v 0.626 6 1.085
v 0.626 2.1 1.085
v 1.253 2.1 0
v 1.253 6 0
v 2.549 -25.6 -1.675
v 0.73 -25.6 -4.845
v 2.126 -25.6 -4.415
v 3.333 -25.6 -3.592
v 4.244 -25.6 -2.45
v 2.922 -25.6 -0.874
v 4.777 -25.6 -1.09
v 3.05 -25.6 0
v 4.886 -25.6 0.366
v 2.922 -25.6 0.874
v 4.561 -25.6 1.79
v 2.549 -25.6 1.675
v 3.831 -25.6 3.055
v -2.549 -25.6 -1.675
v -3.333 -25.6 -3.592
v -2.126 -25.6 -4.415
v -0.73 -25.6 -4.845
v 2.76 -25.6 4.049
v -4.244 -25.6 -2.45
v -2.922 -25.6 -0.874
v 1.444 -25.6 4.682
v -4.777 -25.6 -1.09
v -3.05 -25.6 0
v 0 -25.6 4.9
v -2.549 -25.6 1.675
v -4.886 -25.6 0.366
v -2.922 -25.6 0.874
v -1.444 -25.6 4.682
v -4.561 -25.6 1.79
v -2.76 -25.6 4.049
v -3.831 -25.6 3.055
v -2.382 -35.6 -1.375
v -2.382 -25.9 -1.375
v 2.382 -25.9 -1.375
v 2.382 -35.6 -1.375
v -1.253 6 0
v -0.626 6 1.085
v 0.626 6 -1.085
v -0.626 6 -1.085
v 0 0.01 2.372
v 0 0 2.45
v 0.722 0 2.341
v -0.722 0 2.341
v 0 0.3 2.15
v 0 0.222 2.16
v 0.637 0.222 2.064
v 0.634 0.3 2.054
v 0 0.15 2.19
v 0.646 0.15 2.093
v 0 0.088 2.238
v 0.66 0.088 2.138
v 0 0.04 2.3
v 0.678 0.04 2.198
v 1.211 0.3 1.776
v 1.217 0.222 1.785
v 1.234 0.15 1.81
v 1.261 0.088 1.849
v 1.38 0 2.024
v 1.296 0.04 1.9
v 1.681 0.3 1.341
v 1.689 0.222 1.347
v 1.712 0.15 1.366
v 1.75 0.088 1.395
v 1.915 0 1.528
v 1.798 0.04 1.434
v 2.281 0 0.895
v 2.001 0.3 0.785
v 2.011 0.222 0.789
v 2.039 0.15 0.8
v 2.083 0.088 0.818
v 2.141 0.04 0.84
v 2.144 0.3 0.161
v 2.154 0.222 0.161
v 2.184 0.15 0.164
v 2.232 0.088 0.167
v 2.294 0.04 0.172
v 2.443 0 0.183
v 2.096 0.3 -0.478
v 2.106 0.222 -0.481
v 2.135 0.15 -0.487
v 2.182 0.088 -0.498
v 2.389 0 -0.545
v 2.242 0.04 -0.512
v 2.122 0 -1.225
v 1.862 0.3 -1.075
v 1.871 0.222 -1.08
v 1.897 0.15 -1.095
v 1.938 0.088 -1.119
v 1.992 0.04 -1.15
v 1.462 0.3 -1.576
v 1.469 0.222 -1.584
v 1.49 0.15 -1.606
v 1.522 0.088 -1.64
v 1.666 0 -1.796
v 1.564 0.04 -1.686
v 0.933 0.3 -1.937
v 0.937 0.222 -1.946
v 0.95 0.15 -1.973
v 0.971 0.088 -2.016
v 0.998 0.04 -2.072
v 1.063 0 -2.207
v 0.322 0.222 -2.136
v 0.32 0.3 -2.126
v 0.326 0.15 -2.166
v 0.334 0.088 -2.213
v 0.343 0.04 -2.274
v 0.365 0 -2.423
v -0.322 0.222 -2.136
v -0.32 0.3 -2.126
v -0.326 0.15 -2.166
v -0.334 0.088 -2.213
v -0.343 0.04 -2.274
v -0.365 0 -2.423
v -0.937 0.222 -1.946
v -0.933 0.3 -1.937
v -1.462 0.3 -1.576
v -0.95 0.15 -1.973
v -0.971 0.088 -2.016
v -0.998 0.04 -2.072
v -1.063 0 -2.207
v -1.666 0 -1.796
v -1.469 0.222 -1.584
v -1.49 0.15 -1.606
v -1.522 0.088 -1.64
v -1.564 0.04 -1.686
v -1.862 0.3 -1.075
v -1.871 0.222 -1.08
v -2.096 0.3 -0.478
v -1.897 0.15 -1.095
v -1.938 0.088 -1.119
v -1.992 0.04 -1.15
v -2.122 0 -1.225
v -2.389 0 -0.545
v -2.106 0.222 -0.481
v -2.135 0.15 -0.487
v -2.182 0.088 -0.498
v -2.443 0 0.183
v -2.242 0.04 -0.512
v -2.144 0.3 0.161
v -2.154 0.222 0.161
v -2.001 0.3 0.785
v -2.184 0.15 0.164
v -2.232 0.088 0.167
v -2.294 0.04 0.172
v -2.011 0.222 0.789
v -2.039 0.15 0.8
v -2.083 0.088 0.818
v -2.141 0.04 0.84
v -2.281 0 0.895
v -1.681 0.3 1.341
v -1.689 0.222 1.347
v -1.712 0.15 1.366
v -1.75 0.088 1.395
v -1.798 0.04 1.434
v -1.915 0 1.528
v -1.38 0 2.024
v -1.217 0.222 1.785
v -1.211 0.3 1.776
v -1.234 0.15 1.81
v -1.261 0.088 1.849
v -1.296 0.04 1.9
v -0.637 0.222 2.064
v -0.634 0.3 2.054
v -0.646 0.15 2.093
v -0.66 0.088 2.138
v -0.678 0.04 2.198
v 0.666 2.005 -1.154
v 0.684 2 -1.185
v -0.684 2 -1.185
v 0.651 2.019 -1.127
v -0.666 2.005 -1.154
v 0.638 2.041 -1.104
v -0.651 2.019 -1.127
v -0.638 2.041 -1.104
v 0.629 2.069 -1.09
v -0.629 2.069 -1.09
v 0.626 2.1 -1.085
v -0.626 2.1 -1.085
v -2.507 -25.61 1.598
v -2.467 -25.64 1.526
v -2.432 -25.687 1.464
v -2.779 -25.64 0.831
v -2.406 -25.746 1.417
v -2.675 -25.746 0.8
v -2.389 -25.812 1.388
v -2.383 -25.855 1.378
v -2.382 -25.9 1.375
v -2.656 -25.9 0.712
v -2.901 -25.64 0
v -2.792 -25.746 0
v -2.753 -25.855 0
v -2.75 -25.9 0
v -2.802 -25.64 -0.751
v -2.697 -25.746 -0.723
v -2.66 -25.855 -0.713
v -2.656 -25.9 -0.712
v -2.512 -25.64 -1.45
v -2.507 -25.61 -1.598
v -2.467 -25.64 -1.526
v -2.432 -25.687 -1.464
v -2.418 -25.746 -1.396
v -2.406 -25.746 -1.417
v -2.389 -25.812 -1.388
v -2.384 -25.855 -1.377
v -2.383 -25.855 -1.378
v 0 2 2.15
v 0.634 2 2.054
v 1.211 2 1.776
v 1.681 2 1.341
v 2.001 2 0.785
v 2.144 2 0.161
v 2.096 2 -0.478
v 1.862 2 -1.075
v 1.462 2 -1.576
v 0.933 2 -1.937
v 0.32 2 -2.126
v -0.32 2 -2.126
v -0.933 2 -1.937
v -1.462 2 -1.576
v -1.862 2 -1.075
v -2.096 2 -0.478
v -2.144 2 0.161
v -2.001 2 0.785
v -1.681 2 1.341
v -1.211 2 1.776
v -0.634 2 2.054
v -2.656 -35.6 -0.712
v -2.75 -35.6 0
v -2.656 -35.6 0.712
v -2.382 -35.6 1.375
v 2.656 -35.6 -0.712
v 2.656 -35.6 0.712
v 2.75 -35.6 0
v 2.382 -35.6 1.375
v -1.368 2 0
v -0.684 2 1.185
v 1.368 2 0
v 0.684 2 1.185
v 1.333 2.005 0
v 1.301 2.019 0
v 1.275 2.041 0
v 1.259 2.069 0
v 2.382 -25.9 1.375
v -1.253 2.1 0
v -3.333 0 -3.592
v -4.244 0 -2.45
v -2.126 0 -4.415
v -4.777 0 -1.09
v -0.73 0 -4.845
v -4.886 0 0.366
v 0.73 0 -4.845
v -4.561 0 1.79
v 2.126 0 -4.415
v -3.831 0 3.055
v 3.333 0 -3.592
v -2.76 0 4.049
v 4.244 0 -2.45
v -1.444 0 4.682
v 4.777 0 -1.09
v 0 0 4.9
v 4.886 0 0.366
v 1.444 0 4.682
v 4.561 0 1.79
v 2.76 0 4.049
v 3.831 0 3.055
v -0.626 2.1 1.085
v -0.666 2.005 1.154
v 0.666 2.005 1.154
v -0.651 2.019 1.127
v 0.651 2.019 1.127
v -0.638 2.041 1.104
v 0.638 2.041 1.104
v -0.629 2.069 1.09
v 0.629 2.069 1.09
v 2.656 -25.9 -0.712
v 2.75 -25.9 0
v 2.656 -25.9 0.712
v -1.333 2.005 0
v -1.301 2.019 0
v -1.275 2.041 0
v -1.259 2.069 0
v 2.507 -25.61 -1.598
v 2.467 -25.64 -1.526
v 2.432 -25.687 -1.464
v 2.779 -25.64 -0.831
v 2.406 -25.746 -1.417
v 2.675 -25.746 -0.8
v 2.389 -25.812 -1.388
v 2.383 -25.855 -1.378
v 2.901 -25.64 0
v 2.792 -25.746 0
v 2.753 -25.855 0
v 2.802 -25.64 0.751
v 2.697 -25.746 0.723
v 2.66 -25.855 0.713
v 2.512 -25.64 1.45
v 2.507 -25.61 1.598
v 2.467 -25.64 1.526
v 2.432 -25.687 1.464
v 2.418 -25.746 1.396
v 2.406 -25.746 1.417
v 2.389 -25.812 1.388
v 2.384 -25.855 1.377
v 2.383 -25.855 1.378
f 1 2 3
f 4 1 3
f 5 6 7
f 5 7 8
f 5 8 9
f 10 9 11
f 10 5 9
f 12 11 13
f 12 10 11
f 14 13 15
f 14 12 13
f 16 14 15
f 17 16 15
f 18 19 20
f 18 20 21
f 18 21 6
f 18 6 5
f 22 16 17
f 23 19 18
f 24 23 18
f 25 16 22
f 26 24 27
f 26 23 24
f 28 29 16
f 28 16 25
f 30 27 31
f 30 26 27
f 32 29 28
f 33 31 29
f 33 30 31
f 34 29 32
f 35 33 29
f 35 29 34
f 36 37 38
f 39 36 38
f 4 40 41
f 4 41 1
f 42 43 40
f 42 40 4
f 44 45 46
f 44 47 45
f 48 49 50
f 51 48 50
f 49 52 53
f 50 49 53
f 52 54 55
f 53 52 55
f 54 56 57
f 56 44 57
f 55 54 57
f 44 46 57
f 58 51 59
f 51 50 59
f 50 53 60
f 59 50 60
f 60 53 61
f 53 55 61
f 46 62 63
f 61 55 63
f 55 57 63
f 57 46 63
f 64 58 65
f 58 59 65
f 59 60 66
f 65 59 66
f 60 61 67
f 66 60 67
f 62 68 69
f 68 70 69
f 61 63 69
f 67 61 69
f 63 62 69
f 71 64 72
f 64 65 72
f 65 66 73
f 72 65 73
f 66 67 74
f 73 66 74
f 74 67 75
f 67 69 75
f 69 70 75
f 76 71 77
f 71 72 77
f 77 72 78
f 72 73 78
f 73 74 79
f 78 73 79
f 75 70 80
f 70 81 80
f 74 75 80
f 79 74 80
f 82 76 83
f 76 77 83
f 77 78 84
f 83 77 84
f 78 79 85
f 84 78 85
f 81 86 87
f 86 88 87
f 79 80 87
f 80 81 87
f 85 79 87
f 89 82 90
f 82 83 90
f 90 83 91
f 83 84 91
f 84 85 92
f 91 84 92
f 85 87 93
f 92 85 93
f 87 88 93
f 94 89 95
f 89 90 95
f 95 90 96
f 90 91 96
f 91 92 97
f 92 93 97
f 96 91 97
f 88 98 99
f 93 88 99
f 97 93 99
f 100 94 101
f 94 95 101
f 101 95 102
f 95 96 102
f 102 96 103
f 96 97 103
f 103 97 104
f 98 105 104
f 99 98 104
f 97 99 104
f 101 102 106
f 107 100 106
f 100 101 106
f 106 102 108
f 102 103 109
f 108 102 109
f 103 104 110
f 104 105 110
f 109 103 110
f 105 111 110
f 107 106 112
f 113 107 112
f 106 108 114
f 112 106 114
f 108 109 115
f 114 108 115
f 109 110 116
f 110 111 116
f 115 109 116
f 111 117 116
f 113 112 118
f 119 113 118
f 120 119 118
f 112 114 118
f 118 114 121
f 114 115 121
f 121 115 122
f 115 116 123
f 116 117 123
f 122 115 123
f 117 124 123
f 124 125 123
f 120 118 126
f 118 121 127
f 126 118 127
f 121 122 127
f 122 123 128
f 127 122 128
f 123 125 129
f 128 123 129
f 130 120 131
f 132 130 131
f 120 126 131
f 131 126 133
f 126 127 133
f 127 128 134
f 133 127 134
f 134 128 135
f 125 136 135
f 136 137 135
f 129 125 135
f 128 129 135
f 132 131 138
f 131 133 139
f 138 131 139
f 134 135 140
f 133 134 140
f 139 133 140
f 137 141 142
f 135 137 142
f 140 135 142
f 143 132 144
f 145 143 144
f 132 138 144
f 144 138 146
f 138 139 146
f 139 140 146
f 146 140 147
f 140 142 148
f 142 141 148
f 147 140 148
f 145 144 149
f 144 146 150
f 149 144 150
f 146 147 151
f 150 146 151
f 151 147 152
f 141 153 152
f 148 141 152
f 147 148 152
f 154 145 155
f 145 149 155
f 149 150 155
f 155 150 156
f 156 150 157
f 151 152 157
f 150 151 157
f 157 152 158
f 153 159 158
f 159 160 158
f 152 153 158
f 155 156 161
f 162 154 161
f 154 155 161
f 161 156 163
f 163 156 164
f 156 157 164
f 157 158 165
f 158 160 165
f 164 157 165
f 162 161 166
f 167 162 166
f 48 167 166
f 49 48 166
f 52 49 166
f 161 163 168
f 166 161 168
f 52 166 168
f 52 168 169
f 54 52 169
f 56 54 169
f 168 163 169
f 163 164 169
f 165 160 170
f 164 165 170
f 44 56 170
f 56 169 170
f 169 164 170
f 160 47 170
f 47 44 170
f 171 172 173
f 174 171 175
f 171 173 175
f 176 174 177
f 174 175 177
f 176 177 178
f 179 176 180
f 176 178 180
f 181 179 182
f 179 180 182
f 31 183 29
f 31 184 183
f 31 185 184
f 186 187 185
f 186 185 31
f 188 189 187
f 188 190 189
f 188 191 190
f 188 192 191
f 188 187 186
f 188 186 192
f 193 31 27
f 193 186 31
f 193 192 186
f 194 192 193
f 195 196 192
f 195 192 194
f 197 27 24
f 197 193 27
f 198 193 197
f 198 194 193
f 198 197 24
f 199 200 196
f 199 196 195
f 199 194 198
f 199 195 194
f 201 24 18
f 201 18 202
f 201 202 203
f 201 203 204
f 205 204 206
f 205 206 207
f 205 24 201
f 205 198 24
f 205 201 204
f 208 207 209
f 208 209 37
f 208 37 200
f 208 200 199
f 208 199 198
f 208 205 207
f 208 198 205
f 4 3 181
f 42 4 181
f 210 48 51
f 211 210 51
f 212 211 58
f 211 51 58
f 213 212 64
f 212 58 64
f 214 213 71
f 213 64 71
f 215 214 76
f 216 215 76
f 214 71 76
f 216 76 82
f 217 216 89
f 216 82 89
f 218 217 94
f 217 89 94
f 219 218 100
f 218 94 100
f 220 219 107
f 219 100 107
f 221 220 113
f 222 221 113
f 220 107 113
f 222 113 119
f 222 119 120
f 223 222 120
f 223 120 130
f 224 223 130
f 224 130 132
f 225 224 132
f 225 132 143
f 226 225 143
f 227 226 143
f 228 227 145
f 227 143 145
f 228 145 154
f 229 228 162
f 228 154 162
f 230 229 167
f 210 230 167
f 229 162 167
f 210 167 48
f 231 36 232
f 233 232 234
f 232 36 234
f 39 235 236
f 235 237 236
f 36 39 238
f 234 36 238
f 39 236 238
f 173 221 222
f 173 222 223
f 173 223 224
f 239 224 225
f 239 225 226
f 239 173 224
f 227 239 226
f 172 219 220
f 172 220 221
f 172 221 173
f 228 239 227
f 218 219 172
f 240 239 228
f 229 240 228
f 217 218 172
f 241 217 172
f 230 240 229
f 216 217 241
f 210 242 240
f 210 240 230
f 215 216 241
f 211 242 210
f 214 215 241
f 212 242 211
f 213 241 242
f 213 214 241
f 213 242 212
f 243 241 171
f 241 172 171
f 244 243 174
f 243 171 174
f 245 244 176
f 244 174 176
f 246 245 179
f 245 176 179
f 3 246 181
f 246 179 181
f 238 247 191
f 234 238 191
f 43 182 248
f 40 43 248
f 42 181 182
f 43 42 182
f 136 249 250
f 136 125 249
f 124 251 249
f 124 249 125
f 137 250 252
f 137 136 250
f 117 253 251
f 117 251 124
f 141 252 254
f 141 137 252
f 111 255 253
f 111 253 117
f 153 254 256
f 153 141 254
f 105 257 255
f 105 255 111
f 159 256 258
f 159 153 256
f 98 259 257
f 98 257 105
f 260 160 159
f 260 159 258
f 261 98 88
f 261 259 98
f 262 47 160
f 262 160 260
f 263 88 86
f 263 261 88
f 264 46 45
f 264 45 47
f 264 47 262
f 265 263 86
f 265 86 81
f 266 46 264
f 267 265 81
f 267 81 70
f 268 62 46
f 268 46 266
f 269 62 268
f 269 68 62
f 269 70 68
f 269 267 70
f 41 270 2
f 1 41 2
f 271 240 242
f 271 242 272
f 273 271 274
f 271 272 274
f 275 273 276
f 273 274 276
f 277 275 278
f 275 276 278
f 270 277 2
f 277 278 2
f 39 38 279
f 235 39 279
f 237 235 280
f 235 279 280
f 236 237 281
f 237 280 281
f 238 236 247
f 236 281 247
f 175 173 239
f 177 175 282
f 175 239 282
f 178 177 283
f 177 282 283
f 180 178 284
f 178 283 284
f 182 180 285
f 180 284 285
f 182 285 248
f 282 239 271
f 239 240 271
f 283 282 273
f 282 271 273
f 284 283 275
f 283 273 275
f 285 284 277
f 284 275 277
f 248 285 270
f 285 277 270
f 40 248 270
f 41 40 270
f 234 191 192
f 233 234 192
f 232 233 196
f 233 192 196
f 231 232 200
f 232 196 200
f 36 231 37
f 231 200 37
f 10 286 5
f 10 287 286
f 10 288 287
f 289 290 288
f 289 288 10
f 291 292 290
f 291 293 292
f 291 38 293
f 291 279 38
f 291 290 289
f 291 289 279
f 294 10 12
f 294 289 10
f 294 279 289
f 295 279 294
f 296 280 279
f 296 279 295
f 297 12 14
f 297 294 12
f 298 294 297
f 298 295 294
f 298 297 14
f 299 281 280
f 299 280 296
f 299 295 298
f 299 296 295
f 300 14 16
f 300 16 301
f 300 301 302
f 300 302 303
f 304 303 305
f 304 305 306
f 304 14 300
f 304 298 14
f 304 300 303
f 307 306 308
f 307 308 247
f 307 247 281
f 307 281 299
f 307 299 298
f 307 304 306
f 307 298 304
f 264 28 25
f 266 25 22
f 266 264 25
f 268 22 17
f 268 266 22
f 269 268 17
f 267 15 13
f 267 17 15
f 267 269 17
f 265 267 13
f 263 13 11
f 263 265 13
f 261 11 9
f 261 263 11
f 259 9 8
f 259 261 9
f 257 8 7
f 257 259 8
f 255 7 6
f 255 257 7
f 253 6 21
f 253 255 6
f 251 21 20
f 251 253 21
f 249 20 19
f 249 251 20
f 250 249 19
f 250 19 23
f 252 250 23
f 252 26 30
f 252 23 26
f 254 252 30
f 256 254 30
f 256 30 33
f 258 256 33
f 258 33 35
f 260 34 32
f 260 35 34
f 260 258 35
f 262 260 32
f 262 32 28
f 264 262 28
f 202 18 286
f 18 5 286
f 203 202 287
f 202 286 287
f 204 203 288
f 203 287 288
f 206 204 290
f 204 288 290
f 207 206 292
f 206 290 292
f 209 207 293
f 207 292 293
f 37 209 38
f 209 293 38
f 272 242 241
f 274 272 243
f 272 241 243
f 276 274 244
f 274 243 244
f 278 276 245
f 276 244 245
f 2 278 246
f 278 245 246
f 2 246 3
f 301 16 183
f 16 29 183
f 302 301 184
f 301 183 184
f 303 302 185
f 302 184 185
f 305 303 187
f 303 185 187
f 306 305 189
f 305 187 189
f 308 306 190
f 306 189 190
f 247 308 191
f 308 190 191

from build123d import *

# Parameters (mm, degrees)
CROQUIS5_R              = 4.9
SALIENTE_EXTRUIR1_DEPTH = 35.6
CROQUIS6_R              = 2.15
SALIENTE_EXTRUIR2_DEPTH = 2
SALIENTE_EXTRUIR3_DEPTH = 4
REDONDEO3_R             = 0.1
REDONDEO4_R             = 0.3
CORTAR_EXTRUIR1_START   = -10
CROQUIS8_R              = 4.9
CORTAR_EXTRUIR1_DEPTH   = 10
REDONDEO5_R             = 0.3


with BuildPart() as part:
    # Croquis5 → Saliente-Extruir1 (new body)
    with BuildSketch(Plane(origin=(0, 0, 0), x_dir=(1, 0, 0), z_dir=(0, 1, 0))):
        with Locations(Location((0, 0, 0), (0, 0, 270))):
            Circle(CROQUIS5_R)
    extrude(amount=-SALIENTE_EXTRUIR1_DEPTH)

    # Croquis6 → Saliente-Extruir2 (add)
    with BuildSketch(Plane(origin=(0, 0, 0), x_dir=(1, 0, 0), z_dir=(0, 1, 0))):
        with Locations(Location((0, 0, 0), (0, 0, 270))):
            Circle(CROQUIS6_R)
    extrude(amount=SALIENTE_EXTRUIR2_DEPTH)

    # Croquis7 → Saliente-Extruir3 (add)
    with BuildSketch(Plane(origin=(0, 2, 0), x_dir=(1, 0, 0), z_dir=(0, 1, 0))):
        Polygon((1.252850084, 0), (0.626425042, 1.085), (-0.626425042, 1.085), (-1.252850084, 0), (-0.626425042, -1.085), (0.626425042, -1.085), align=None)
    extrude(amount=SALIENTE_EXTRUIR3_DEPTH)

    # Redondeo3
    redondeo3_edges = [part.edges().sort_by_distance(p)[0] for p in [
        (0.939637563, 2, 0.5425),
        (0.939637563, 2, -0.5425),
        (0, 2, -1.085),
        (-0.939637563, 2, -0.5425),
        (-0.939637563, 2, 0.5425),
        (0, 2, 1.085),
    ]]
    fillet(redondeo3_edges, radius=REDONDEO3_R)

    # Redondeo4
    redondeo4_edges = [part.edges().sort_by_distance(p)[0] for p in [
        (0, 0, -2.15),
    ]]
    fillet(redondeo4_edges, radius=REDONDEO4_R)

    # Croquis8 → Cortar-Extruir1 (cut)
    with BuildSketch(Plane.XZ.offset(35.6).offset(CORTAR_EXTRUIR1_START)):
        with Locations(Location((0, 0, 0), (0, 0, 90))):
            Circle(CROQUIS8_R)
        with BuildLine():
            ThreePointArc((-2.38156986, 1.375), (-2.75, 0), (-2.38156986, -1.375))
            Line((-2.38156986, -1.375), (2.38156986, -1.375))
            ThreePointArc((2.38156986, -1.375), (2.75, 0), (2.38156986, 1.375))
            Line((2.38156986, 1.375), (-2.38156986, 1.375))
        make_face(mode=Mode.SUBTRACT)
    extrude(amount=CORTAR_EXTRUIR1_DEPTH, mode=Mode.SUBTRACT)

    # Redondeo5
    redondeo5_edges = [part.edges().sort_by_distance(p)[0] for p in [
        (0, -25.6, 1.375),
        (-2.75, -25.6, 0),
        (0, -25.6, -1.375),
        (2.75, -25.6, 0),
    ]]
    fillet(redondeo5_edges, radius=REDONDEO5_R)


solid = part.part
